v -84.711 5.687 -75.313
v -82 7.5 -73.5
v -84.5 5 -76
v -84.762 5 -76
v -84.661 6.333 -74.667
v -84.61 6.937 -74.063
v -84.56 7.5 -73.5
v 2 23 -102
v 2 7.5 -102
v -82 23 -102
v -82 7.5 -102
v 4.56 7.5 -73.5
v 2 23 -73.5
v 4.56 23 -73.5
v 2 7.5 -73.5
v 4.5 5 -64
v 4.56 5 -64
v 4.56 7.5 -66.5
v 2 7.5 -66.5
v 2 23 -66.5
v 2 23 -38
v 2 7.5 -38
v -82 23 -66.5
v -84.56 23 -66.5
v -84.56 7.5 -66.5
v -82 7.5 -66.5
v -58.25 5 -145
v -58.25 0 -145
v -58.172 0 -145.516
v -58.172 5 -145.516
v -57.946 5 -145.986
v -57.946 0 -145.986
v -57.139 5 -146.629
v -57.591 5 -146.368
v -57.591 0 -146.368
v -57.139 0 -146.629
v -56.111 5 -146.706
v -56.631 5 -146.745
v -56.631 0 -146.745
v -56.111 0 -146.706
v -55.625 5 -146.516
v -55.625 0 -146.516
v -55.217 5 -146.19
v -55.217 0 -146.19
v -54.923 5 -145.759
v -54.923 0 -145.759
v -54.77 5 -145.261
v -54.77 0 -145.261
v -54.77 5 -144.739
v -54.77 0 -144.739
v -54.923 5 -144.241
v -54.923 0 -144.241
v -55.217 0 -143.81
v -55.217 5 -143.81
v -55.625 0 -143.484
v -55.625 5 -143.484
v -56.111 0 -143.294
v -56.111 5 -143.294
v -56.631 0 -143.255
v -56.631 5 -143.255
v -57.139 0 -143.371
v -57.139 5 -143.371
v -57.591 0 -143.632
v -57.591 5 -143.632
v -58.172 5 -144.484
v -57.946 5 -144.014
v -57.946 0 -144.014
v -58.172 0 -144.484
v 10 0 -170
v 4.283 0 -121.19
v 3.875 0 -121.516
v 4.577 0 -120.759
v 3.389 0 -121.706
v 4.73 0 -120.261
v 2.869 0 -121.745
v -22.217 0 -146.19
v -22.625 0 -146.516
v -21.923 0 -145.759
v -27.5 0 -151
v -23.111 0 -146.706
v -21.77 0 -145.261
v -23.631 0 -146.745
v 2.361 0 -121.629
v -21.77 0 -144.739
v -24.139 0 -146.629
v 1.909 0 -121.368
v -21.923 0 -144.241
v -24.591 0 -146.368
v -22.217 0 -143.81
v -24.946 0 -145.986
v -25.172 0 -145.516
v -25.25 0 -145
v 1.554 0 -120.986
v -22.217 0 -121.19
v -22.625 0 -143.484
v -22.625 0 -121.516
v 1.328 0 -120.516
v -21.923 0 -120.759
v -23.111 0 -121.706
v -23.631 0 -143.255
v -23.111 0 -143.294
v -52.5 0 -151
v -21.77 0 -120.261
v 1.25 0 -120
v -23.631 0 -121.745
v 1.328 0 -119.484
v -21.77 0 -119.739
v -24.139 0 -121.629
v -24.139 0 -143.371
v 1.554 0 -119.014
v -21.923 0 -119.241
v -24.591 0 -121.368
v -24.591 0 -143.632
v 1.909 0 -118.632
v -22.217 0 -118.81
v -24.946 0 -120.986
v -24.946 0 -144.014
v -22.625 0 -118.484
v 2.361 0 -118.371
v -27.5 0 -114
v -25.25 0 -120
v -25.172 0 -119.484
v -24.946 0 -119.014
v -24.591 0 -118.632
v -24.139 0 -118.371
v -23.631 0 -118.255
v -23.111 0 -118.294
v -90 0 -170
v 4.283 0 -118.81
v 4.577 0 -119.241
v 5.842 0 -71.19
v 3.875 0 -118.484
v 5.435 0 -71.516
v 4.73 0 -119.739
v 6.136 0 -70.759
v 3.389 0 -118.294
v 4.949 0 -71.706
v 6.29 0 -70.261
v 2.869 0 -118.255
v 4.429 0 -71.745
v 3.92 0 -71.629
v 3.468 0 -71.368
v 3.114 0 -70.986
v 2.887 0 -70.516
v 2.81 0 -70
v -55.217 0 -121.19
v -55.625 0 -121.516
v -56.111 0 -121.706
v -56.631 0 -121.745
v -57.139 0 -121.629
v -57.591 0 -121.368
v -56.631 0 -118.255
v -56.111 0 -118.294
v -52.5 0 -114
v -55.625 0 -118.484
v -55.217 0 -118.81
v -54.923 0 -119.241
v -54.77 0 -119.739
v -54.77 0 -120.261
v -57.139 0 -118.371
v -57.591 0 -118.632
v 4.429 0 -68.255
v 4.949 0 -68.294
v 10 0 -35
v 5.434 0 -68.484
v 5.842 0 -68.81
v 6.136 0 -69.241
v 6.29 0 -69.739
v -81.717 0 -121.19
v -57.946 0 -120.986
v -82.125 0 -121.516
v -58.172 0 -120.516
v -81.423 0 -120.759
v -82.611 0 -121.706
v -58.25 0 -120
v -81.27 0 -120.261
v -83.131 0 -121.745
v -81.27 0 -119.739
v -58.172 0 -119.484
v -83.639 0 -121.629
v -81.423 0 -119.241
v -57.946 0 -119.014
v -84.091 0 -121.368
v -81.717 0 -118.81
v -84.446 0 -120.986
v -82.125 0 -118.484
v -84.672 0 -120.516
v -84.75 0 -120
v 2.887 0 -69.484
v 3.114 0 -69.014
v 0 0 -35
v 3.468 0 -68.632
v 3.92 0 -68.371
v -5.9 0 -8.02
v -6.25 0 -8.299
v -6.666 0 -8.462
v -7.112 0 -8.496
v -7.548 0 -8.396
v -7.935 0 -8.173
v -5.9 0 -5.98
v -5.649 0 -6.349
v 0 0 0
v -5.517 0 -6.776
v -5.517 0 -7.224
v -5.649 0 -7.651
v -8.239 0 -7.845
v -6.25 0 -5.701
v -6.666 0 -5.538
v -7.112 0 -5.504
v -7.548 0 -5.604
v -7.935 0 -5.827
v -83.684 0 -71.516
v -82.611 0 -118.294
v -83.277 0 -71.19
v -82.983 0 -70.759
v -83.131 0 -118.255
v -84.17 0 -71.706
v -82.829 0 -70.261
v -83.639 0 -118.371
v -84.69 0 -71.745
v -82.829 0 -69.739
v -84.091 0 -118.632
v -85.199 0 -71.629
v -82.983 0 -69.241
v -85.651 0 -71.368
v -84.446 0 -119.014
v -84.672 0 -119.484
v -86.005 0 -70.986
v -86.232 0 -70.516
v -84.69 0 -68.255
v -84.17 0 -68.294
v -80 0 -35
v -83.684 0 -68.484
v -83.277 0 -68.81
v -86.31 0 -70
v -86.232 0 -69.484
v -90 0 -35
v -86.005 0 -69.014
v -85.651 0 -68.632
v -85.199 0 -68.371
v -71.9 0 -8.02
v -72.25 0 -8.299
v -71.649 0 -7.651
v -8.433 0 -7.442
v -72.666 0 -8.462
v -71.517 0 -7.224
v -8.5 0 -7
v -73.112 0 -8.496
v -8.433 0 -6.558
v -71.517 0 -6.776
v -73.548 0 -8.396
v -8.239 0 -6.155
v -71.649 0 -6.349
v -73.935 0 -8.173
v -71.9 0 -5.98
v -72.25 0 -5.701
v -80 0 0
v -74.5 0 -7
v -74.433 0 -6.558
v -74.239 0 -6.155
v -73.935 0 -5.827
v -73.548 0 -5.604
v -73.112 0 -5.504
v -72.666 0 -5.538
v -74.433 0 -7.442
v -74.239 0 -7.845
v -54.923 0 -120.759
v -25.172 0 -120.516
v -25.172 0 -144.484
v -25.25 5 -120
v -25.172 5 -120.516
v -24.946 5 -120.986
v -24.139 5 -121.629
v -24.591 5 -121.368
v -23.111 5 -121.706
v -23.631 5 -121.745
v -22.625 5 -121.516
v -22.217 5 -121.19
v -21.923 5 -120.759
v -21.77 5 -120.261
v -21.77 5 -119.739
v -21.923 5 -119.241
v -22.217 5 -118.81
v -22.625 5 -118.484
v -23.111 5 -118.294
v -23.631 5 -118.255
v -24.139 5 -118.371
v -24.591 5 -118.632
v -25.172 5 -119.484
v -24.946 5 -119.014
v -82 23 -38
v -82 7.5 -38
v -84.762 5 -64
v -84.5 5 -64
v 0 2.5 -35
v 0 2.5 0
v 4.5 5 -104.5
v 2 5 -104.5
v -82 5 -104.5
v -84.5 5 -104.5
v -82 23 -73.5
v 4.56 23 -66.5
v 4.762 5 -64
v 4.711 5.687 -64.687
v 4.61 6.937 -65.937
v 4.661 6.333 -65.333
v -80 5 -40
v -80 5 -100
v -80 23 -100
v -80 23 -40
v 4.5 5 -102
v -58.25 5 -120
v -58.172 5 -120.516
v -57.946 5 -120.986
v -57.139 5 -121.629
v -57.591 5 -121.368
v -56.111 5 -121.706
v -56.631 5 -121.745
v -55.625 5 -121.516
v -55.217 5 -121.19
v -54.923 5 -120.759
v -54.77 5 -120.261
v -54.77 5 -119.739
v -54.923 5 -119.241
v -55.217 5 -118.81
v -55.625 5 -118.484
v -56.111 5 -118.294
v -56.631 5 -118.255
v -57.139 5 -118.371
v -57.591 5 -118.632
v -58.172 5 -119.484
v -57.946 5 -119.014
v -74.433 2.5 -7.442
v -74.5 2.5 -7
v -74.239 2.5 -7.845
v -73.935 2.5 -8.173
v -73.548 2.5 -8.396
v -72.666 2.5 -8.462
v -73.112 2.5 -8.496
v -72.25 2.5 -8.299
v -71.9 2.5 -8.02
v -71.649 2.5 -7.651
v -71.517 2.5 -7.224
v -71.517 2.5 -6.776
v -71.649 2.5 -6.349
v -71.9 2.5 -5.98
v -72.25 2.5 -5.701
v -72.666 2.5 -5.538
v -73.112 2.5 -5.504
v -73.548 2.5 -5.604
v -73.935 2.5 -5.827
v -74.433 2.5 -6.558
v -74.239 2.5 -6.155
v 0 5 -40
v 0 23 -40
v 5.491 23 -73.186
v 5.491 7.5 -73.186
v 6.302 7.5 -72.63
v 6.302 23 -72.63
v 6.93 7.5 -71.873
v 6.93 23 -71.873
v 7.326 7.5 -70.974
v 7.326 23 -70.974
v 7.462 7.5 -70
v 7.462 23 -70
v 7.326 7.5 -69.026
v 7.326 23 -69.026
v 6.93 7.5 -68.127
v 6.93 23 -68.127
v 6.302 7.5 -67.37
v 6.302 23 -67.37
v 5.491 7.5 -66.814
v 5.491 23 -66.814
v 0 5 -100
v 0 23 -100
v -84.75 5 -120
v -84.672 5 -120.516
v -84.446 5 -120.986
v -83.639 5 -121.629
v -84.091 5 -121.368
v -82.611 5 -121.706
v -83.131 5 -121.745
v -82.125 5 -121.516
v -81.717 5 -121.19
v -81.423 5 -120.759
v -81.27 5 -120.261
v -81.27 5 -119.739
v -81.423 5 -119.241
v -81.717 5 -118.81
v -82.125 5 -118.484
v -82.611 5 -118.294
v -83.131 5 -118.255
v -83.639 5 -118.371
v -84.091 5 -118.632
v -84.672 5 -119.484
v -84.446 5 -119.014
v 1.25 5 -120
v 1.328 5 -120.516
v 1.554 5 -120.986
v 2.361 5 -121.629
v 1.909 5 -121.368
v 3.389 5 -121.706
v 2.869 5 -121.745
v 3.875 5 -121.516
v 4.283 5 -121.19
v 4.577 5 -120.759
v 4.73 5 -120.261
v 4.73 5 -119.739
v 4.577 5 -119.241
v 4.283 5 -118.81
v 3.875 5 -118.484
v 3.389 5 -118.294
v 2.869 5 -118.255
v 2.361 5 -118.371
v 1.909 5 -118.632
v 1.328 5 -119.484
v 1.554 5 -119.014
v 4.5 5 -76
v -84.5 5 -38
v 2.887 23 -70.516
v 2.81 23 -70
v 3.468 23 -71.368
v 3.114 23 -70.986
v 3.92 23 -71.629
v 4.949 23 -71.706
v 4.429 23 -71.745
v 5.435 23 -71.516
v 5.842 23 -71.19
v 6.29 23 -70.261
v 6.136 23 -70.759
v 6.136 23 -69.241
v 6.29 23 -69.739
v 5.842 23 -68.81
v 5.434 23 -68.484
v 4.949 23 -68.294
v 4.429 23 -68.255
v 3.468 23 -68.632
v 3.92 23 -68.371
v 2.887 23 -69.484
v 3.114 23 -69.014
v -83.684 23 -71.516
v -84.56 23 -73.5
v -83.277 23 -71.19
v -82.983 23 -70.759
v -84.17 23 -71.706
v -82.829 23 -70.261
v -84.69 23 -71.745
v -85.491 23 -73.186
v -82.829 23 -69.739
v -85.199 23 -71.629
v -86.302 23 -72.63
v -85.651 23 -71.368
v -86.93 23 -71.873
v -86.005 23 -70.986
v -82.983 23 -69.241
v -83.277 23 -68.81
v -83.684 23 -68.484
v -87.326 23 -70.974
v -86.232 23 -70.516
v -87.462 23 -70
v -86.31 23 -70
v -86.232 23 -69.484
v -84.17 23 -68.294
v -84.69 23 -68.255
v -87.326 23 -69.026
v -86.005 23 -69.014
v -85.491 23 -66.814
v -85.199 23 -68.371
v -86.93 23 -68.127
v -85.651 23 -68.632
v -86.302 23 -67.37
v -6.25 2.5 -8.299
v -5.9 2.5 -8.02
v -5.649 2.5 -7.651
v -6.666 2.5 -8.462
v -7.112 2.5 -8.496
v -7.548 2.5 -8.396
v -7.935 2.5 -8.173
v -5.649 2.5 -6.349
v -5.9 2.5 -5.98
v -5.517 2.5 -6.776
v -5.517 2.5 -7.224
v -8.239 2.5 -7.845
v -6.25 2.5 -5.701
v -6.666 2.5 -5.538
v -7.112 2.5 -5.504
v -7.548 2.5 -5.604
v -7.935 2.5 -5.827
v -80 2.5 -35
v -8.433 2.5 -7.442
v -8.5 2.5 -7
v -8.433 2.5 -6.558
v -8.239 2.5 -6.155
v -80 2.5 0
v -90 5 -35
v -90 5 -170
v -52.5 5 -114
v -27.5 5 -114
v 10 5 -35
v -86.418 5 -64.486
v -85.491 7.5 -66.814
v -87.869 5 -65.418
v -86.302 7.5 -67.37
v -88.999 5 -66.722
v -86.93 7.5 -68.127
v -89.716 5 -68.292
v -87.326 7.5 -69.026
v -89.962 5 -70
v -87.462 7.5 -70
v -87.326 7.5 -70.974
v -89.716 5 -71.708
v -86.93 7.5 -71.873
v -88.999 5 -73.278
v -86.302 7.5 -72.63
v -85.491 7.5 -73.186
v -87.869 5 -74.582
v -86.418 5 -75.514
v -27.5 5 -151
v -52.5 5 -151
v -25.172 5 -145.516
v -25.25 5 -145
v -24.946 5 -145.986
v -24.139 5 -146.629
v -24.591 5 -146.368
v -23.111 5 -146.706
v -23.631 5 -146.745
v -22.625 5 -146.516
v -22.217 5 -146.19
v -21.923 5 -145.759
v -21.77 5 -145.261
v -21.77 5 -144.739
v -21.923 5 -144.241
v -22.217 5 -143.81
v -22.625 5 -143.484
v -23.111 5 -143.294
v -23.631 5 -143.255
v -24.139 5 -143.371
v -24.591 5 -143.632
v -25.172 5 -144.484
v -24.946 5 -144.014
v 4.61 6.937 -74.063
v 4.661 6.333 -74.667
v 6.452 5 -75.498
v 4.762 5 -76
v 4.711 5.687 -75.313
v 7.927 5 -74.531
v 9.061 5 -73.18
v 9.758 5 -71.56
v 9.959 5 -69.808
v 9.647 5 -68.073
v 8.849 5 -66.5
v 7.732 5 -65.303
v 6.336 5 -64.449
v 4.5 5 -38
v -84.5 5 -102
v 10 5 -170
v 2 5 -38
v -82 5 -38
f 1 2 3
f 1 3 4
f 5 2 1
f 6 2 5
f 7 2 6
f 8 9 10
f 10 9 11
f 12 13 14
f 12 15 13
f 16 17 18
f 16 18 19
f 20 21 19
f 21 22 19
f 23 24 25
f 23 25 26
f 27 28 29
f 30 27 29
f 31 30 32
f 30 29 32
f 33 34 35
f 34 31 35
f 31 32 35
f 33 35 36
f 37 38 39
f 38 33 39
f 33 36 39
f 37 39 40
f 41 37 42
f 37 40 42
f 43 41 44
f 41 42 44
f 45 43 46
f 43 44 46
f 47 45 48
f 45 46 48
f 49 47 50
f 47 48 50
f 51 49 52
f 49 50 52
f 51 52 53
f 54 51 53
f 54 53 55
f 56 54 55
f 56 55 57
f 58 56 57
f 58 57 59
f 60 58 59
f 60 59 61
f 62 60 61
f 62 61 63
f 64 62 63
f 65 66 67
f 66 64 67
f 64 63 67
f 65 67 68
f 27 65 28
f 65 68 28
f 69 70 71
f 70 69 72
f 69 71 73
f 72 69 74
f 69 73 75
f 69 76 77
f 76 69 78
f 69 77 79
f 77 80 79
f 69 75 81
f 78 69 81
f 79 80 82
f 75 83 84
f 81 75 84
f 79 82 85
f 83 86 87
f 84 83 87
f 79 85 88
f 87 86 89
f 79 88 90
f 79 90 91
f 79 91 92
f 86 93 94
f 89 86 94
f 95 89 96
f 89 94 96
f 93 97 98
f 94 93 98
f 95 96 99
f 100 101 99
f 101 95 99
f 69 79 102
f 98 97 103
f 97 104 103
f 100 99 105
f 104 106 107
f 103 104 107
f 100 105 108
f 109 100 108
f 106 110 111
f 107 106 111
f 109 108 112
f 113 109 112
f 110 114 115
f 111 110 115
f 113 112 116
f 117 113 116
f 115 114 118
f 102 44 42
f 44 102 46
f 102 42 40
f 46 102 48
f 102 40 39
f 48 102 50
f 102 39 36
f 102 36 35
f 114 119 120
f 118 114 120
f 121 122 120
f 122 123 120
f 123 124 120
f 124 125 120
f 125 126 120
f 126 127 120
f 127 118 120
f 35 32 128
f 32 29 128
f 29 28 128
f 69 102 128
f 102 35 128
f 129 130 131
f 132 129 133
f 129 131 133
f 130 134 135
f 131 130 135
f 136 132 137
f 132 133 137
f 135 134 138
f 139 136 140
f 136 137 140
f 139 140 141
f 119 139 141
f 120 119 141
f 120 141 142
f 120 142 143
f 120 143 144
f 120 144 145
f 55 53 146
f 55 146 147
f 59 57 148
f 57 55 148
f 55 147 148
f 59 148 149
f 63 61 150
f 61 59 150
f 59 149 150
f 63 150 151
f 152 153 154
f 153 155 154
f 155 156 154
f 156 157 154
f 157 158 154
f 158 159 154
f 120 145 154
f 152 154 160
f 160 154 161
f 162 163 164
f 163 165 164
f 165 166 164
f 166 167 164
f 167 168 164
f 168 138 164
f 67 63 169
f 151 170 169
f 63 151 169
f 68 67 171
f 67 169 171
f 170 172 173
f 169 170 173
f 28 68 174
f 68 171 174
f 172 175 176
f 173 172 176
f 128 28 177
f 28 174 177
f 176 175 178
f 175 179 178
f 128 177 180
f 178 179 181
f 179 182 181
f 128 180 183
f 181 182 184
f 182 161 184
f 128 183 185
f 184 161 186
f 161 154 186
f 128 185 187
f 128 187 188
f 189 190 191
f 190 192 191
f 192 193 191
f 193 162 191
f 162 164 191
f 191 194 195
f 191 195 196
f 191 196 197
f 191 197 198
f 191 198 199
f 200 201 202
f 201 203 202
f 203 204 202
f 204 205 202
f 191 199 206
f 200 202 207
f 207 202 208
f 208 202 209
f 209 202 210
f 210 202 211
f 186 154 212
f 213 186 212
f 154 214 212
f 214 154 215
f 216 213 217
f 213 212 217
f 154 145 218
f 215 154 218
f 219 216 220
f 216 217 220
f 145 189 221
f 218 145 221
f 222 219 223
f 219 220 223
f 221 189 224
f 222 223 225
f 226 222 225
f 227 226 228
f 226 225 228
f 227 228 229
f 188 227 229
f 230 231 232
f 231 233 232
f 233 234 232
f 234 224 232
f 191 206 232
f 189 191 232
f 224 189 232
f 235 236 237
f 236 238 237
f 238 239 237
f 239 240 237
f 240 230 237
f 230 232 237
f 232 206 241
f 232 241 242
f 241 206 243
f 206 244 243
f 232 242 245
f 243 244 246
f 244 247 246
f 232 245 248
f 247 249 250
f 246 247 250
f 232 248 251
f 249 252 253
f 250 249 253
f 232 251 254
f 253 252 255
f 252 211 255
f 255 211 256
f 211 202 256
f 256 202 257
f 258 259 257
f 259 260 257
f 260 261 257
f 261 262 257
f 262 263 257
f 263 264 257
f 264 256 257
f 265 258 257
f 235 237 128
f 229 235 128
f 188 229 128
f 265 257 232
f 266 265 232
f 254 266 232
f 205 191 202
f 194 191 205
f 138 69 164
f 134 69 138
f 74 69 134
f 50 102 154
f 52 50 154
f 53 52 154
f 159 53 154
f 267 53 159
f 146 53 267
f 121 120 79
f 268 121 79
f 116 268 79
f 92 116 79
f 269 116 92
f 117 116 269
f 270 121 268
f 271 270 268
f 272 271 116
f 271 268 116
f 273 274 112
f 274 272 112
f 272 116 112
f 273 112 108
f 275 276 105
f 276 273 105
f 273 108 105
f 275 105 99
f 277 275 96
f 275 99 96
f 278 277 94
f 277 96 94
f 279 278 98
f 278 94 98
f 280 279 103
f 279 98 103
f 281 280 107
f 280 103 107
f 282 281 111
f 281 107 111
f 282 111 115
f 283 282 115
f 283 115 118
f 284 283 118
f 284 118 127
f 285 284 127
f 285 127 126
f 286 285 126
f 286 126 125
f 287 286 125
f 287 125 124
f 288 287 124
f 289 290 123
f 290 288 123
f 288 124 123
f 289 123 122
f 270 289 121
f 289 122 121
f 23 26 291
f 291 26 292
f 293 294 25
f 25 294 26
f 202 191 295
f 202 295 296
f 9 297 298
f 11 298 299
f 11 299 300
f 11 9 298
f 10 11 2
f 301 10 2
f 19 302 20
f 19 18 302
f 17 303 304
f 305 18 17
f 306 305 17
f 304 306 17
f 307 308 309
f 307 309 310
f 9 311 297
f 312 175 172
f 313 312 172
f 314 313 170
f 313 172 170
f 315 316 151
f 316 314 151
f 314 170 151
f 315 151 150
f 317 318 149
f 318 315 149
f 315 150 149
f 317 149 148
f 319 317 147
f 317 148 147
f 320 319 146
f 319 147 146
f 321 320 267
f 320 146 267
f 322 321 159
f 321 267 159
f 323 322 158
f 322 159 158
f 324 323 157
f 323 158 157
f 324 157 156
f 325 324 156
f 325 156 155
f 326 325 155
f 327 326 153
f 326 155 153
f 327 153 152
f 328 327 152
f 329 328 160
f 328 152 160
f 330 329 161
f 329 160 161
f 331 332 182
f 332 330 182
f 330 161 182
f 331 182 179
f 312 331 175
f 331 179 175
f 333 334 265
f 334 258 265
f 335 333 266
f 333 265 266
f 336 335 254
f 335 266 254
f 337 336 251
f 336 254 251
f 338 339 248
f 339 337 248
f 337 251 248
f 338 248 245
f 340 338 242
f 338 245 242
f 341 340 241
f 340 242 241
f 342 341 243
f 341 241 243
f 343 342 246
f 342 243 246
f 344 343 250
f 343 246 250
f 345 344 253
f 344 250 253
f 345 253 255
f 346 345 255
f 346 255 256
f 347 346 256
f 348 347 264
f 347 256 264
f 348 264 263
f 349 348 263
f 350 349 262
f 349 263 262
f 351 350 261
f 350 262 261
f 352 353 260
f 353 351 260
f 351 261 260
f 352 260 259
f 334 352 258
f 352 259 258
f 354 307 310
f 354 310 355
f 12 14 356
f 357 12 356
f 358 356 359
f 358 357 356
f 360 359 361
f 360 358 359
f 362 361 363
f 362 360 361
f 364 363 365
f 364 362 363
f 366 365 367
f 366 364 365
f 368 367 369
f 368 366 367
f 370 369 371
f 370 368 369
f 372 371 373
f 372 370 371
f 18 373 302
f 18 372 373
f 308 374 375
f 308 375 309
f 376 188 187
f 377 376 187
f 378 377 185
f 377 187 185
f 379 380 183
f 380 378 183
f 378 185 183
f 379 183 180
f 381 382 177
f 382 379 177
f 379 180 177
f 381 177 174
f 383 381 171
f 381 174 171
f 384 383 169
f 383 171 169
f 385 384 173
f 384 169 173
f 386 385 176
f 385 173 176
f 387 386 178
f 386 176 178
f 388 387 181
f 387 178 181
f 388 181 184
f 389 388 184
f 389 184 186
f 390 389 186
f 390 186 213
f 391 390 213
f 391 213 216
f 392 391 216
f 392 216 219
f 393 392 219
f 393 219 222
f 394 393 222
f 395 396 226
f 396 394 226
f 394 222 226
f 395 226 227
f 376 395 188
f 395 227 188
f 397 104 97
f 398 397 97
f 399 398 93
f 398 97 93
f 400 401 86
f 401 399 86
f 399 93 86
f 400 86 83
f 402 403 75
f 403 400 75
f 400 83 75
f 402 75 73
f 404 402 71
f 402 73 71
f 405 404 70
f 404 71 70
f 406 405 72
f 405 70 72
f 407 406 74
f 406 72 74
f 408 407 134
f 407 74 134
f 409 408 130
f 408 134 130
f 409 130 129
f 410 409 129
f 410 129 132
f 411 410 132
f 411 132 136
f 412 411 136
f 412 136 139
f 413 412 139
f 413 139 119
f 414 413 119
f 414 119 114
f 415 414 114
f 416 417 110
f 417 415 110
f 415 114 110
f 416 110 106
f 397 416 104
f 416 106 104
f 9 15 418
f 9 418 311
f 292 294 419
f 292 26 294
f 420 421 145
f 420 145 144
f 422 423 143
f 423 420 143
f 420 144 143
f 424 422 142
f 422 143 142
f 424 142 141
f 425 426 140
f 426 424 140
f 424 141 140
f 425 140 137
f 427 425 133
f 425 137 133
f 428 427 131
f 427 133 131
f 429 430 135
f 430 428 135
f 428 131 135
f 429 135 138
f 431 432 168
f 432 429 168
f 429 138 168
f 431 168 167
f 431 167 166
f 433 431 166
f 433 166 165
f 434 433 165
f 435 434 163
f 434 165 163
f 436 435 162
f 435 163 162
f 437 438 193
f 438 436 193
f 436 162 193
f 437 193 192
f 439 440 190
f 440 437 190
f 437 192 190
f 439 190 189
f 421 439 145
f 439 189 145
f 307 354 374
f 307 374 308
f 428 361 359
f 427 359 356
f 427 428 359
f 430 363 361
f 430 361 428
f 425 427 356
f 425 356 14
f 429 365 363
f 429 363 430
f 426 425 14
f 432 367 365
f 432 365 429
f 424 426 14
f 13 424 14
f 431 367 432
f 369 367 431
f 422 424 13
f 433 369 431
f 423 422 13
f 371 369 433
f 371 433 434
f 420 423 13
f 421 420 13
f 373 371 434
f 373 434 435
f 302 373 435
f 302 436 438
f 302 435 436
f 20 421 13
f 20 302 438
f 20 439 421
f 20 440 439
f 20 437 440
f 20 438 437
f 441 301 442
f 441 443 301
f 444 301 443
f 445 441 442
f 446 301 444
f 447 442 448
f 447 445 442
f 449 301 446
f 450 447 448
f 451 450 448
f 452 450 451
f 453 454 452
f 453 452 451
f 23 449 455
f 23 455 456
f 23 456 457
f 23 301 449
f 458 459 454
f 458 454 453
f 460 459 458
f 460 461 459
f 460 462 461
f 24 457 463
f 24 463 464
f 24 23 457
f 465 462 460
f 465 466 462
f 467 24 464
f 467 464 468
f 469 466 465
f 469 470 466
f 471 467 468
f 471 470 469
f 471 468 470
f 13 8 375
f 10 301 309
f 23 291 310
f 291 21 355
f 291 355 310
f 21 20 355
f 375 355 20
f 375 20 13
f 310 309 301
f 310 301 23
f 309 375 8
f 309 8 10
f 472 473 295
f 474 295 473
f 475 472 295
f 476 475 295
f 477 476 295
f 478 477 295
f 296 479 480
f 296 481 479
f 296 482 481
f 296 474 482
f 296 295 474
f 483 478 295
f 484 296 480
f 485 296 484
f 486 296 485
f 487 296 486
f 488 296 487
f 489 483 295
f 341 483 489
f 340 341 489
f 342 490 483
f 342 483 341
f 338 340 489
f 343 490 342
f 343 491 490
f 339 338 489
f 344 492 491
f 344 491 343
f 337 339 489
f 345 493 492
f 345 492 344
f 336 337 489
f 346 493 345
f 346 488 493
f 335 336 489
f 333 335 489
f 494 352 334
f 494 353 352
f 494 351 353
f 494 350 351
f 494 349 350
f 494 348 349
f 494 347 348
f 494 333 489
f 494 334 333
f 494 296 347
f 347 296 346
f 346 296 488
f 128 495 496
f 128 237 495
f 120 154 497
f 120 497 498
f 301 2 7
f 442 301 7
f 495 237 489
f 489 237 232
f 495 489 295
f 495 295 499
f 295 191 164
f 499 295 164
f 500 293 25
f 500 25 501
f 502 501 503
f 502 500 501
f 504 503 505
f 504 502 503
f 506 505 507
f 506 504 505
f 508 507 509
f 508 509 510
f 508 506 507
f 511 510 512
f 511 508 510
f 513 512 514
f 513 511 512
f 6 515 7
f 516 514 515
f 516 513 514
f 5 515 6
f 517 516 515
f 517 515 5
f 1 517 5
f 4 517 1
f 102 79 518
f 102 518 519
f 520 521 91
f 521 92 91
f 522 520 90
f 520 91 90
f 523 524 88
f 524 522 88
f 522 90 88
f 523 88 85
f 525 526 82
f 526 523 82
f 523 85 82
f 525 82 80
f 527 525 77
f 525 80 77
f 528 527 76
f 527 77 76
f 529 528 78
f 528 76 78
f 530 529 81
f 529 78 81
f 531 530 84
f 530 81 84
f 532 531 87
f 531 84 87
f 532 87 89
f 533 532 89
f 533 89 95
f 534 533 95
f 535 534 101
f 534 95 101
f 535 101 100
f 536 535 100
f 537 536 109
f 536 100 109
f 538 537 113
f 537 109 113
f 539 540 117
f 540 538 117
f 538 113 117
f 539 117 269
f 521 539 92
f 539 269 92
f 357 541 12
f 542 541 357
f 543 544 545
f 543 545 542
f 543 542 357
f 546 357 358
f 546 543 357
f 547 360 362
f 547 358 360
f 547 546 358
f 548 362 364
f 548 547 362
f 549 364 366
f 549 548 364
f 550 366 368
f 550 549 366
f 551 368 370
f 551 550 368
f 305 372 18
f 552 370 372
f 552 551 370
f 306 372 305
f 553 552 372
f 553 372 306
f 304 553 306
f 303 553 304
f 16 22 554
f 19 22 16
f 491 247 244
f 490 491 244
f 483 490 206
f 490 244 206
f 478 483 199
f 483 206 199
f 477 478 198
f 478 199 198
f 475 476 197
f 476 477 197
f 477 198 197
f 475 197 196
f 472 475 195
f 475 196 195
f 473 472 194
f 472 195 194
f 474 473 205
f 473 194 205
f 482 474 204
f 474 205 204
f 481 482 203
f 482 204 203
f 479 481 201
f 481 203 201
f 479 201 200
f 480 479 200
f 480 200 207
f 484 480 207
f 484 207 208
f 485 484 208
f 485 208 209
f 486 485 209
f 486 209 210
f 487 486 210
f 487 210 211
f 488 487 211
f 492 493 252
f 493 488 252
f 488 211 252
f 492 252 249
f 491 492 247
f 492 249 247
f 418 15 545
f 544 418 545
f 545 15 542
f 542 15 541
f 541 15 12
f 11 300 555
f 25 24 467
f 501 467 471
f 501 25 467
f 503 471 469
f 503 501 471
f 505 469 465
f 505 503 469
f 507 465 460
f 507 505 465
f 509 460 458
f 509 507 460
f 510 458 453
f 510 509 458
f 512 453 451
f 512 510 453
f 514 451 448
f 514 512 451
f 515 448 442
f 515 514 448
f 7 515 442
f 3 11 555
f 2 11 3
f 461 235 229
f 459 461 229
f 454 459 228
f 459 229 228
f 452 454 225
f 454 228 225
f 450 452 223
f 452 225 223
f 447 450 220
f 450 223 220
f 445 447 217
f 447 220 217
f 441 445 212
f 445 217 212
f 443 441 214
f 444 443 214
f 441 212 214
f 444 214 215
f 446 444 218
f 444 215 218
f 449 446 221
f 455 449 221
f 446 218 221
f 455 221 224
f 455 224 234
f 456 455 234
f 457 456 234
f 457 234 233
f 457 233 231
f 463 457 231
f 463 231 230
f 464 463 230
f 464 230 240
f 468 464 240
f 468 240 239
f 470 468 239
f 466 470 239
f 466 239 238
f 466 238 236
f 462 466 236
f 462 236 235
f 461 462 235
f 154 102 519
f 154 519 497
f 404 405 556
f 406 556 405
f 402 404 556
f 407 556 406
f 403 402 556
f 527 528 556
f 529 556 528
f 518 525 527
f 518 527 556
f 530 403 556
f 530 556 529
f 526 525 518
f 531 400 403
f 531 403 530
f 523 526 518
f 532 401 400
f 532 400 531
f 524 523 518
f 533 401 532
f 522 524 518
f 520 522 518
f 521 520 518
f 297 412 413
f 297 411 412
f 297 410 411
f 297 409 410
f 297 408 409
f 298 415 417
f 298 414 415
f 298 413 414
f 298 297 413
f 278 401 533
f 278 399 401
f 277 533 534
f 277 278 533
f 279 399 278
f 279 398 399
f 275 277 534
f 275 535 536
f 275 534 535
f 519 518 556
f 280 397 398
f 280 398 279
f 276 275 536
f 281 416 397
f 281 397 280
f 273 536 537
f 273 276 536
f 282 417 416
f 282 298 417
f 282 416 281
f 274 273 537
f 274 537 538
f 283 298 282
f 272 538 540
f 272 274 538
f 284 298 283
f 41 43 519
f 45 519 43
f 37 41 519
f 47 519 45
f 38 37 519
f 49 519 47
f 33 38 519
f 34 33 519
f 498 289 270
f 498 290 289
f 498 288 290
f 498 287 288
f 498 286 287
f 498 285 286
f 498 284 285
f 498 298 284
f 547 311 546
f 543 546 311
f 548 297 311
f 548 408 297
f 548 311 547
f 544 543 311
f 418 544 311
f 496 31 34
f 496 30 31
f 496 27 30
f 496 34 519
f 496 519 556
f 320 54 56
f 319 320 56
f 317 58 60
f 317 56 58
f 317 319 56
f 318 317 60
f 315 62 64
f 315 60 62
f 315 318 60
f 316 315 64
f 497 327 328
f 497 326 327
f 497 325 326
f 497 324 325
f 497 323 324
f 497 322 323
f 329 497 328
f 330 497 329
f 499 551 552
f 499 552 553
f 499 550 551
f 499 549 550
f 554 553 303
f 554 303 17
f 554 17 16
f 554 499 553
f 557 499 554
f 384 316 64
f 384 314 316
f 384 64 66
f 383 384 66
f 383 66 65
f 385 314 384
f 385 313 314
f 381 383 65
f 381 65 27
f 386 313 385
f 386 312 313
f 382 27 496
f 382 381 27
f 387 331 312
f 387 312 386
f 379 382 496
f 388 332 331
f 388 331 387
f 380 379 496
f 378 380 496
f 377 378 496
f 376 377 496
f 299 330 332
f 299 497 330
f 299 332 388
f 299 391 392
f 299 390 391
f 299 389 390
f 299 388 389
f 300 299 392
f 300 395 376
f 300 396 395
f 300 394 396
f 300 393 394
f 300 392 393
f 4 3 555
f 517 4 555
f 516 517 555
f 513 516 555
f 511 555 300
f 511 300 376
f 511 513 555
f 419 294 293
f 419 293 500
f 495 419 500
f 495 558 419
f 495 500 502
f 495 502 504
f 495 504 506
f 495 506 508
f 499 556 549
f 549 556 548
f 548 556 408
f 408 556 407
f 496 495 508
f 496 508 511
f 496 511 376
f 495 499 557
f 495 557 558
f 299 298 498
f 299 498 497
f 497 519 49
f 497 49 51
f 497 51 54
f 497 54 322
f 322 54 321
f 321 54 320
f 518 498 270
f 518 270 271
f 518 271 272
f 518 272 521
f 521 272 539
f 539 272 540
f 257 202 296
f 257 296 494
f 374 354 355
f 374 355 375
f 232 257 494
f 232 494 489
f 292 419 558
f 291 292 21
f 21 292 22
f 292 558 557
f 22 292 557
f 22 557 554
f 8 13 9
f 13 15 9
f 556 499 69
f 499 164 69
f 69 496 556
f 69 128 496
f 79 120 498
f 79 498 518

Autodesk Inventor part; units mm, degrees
ref_plane "YZ Plane" through (0, 0, 0) normal (1, 0, 0) x (0, 1, 0)
ref_plane "XZ Plane" through (0, 0, 0) normal (0, 1, 0) x (-1, 0, 0)
ref_plane "XY Plane" through (0, 0, 0) normal (0, 0, 1) x (1, 0, 0)
sketch "Esboço1" plane through (0, 0, 0) normal (0, 1, 0) x (-1, 0, 0)
  line L0 (0, 0) -> (80, 0)
  line L1 (80, -170) -> (0, -170)
  line L2 (80, -40) -> (0, -40)
  line L3 (0, -40) -> (0, -100)
  line L4 (0, -100) -> (80, -100)
  line L5 (80, -100) -> (80, -40)
  line L6 (80, 0) -> (80, -35)
  line L7 (80, -35) -> (90, -35)
  line L8 (90, -35) -> (90, -105)
  line L9 (80, 0) -> (80, -35)
  line L10 (80, -40) -> (80, -100)
  line L11 (90, -70) -> (0, -70)
  line L12 (40, 0) -> (40, -170)
  line L13 (0, -35) -> (-10, -35)
  line L14 (-10, -35) -> (-10, -105)
  line L15 (0, -35) -> (0, 0)
  line L16 (0, -100) -> (0, -40)
  line L17 (52.5, -114) -> (27.5, -114)
  line L18 (27.5, -114) -> (27.5, -151)
  line L19 (27.5, -151) -> (52.5, -151)
  line L20 (52.5, -151) -> (52.5, -114)
  line L21 (82, -38) -> (-2, -38)
  line L22 (-2, -102) -> (82, -102)
  circle A0 centre (84.5595, -70) radius 1.75
  line L23 (84.5595, -66.5) -> (82, -66.5)
  line L24 (82, -73.5) -> (84.5595, -73.5)
  arc A1 (84.5595, -73.5) -> (84.5595, -66.5) centre (83.9005, -70) ccw
  line L25 (82, -102) -> (82, -73.5)
  line L26 (82, -66.5) -> (82, -38)
  circle A2 centre (-4.5595, -70) radius 1.75
  line L27 (-4.5595, -66.5) -> (-2, -66.5)
  line L28 (-2, -73.5) -> (-4.5595, -73.5)
  arc A3 (-4.5595, -66.5) -> (-4.5595, -73.5) centre (-3.9005, -70) ccw
  line L29 (-2, -38) -> (-2, -66.5)
  line L30 (-2, -73.5) -> (-2, -102)
  line L31 (90, -105) -> (90, -151)
  line L32 (90, -151) -> (90, -170)
  line L33 (90, -170) -> (-10, -170)
  line L34 (-10, -170) -> (-10, -105)
  line L35 (80, -35) -> (0, -35)
  circle A4 centre (-3, -120) radius 1.75
  circle A5 centre (83, -120) radius 1.75
  circle A6 centre (7, -7) radius 1.5
  circle A7 centre (73, -7) radius 1.5
  line L36 (52.5, -114) -> (60.5, -114)
  line L37 (60.5, -114) -> (60.5, -151)
  line L38 (60.5, -151) -> (52.5, -151)
  line L39 (52.5, -151) -> (52.5, -114)
  circle A8 centre (56.5, -120) radius 1.75
  circle A9 centre (56.5, -145) radius 1.75
  line L40 (27.5, -114) -> (19.5, -114)
  line L41 (19.5, -114) -> (19.5, -151)
  line L42 (19.5, -151) -> (27.5, -151)
  circle A10 centre (23.5, -120) radius 1.75
  circle A11 centre (23.5, -145) radius 1.75
  point P0 (45, -70)
  point P1 (40, -102)
  point P2 (80, -17.5)
  point P3 (0, -170)
  point P4 (56.5, -114)
  point P5 (56.5, -151)
  dimension "d3" = 60
  dimension "d4" = 35
  dimension "d5" = 10
  dimension "d6" = 70
  dimension "d7" = 30
  dimension "d9" = 80
  dimension "d12" = 64
  dimension "d13" = 32
  dimension "d15" = 3.5
  dimension "d16" = 3.5
  dimension "d17" = 37
  dimension "d18" = 25
  dimension "d19" = 12.5
  dimension "d21" = 19
  dimension "d22" = 12
  dimension "d23" = 80
  dimension "d30" = 3.5
  dimension "d31" = 7
  dimension "d32" = 50
  dimension "d33" = 3
  dimension "d35" = 3.5
  dimension "d36" = 7
  dimension "d37" = 7
  dimension "d54" = 8
  dimension "d55" = 3.5
  dimension "d56" = 3.5
  dimension "d57" = 6
  dimension "d58" = 6
  dimension "d59" = 4
  dimension "d60" = 4
  dimension "d63" = 135
extrude "Extrusão1" add sketch "Esboço1" along normal blind 23 contours L21 L26 L23 A1 L11 A0 L5 L2 L12 | L12 L2 L3 L4 L22 L30 L28 A3 L27 L29 L21 | A1 L24 L25 L22 L12 L4 L5 L11 A0
extrude "Extrusão4" add sketch "Esboço1" along normal blind 2.5 contours L0 L12 L35 L15 | L0 L6 L35 L12
extrude "Extrusão5" add sketch "Esboço1" along normal blind 5 contours L35 L12 L21 L29 L27 A3 L28 L30 L22 L17 L40 L41 L42 L19 L1 L33 L34 L14 L13 | L35 L7 L8 L11 A1 L23 L26 L21 L12 | L12 L11 L3 L2 | L2 L5 L11 L12 | L8 L31 L32 L33 L1 L12 L19 L38 L37 L36 L17 L22 L25 L24 A1 L11 | L12 L4 L3 L11 | L11 L5 L4 L12 | L42 L41 L40 L18 | L20 L36 L37 L38 | A8 | A9 | A10 | A11
chamfer "Chanfro1" distance 2.5 angle 45 1 edges at (-40, 5, -102)
chamfer "Chanfro2" distance 2.5 angle 45 4 edges at (2, 5, -87.75) (7.462, 5, -70) (3.2797, 5, -73.5) (2, 5, -52.25)
chamfer "Chanfro3" distance 2.5 angle 45 1 edges at (4.5297, 5, -66.5)
chamfer "Chanfro4" distance 2.5 angle 45 5 edges at (-82, 5, -87.75) (-87.462, 5, -70) (-82, 5, -52.25) (-83.2797, 5, -73.5) (-83.2797, 5, -66.5)
extrude "Extrusão6" cut sketch "Esboço1" along normal mid plane 10 contours A8 | A9 | A10 | A11
properties part number "peca_principal"
